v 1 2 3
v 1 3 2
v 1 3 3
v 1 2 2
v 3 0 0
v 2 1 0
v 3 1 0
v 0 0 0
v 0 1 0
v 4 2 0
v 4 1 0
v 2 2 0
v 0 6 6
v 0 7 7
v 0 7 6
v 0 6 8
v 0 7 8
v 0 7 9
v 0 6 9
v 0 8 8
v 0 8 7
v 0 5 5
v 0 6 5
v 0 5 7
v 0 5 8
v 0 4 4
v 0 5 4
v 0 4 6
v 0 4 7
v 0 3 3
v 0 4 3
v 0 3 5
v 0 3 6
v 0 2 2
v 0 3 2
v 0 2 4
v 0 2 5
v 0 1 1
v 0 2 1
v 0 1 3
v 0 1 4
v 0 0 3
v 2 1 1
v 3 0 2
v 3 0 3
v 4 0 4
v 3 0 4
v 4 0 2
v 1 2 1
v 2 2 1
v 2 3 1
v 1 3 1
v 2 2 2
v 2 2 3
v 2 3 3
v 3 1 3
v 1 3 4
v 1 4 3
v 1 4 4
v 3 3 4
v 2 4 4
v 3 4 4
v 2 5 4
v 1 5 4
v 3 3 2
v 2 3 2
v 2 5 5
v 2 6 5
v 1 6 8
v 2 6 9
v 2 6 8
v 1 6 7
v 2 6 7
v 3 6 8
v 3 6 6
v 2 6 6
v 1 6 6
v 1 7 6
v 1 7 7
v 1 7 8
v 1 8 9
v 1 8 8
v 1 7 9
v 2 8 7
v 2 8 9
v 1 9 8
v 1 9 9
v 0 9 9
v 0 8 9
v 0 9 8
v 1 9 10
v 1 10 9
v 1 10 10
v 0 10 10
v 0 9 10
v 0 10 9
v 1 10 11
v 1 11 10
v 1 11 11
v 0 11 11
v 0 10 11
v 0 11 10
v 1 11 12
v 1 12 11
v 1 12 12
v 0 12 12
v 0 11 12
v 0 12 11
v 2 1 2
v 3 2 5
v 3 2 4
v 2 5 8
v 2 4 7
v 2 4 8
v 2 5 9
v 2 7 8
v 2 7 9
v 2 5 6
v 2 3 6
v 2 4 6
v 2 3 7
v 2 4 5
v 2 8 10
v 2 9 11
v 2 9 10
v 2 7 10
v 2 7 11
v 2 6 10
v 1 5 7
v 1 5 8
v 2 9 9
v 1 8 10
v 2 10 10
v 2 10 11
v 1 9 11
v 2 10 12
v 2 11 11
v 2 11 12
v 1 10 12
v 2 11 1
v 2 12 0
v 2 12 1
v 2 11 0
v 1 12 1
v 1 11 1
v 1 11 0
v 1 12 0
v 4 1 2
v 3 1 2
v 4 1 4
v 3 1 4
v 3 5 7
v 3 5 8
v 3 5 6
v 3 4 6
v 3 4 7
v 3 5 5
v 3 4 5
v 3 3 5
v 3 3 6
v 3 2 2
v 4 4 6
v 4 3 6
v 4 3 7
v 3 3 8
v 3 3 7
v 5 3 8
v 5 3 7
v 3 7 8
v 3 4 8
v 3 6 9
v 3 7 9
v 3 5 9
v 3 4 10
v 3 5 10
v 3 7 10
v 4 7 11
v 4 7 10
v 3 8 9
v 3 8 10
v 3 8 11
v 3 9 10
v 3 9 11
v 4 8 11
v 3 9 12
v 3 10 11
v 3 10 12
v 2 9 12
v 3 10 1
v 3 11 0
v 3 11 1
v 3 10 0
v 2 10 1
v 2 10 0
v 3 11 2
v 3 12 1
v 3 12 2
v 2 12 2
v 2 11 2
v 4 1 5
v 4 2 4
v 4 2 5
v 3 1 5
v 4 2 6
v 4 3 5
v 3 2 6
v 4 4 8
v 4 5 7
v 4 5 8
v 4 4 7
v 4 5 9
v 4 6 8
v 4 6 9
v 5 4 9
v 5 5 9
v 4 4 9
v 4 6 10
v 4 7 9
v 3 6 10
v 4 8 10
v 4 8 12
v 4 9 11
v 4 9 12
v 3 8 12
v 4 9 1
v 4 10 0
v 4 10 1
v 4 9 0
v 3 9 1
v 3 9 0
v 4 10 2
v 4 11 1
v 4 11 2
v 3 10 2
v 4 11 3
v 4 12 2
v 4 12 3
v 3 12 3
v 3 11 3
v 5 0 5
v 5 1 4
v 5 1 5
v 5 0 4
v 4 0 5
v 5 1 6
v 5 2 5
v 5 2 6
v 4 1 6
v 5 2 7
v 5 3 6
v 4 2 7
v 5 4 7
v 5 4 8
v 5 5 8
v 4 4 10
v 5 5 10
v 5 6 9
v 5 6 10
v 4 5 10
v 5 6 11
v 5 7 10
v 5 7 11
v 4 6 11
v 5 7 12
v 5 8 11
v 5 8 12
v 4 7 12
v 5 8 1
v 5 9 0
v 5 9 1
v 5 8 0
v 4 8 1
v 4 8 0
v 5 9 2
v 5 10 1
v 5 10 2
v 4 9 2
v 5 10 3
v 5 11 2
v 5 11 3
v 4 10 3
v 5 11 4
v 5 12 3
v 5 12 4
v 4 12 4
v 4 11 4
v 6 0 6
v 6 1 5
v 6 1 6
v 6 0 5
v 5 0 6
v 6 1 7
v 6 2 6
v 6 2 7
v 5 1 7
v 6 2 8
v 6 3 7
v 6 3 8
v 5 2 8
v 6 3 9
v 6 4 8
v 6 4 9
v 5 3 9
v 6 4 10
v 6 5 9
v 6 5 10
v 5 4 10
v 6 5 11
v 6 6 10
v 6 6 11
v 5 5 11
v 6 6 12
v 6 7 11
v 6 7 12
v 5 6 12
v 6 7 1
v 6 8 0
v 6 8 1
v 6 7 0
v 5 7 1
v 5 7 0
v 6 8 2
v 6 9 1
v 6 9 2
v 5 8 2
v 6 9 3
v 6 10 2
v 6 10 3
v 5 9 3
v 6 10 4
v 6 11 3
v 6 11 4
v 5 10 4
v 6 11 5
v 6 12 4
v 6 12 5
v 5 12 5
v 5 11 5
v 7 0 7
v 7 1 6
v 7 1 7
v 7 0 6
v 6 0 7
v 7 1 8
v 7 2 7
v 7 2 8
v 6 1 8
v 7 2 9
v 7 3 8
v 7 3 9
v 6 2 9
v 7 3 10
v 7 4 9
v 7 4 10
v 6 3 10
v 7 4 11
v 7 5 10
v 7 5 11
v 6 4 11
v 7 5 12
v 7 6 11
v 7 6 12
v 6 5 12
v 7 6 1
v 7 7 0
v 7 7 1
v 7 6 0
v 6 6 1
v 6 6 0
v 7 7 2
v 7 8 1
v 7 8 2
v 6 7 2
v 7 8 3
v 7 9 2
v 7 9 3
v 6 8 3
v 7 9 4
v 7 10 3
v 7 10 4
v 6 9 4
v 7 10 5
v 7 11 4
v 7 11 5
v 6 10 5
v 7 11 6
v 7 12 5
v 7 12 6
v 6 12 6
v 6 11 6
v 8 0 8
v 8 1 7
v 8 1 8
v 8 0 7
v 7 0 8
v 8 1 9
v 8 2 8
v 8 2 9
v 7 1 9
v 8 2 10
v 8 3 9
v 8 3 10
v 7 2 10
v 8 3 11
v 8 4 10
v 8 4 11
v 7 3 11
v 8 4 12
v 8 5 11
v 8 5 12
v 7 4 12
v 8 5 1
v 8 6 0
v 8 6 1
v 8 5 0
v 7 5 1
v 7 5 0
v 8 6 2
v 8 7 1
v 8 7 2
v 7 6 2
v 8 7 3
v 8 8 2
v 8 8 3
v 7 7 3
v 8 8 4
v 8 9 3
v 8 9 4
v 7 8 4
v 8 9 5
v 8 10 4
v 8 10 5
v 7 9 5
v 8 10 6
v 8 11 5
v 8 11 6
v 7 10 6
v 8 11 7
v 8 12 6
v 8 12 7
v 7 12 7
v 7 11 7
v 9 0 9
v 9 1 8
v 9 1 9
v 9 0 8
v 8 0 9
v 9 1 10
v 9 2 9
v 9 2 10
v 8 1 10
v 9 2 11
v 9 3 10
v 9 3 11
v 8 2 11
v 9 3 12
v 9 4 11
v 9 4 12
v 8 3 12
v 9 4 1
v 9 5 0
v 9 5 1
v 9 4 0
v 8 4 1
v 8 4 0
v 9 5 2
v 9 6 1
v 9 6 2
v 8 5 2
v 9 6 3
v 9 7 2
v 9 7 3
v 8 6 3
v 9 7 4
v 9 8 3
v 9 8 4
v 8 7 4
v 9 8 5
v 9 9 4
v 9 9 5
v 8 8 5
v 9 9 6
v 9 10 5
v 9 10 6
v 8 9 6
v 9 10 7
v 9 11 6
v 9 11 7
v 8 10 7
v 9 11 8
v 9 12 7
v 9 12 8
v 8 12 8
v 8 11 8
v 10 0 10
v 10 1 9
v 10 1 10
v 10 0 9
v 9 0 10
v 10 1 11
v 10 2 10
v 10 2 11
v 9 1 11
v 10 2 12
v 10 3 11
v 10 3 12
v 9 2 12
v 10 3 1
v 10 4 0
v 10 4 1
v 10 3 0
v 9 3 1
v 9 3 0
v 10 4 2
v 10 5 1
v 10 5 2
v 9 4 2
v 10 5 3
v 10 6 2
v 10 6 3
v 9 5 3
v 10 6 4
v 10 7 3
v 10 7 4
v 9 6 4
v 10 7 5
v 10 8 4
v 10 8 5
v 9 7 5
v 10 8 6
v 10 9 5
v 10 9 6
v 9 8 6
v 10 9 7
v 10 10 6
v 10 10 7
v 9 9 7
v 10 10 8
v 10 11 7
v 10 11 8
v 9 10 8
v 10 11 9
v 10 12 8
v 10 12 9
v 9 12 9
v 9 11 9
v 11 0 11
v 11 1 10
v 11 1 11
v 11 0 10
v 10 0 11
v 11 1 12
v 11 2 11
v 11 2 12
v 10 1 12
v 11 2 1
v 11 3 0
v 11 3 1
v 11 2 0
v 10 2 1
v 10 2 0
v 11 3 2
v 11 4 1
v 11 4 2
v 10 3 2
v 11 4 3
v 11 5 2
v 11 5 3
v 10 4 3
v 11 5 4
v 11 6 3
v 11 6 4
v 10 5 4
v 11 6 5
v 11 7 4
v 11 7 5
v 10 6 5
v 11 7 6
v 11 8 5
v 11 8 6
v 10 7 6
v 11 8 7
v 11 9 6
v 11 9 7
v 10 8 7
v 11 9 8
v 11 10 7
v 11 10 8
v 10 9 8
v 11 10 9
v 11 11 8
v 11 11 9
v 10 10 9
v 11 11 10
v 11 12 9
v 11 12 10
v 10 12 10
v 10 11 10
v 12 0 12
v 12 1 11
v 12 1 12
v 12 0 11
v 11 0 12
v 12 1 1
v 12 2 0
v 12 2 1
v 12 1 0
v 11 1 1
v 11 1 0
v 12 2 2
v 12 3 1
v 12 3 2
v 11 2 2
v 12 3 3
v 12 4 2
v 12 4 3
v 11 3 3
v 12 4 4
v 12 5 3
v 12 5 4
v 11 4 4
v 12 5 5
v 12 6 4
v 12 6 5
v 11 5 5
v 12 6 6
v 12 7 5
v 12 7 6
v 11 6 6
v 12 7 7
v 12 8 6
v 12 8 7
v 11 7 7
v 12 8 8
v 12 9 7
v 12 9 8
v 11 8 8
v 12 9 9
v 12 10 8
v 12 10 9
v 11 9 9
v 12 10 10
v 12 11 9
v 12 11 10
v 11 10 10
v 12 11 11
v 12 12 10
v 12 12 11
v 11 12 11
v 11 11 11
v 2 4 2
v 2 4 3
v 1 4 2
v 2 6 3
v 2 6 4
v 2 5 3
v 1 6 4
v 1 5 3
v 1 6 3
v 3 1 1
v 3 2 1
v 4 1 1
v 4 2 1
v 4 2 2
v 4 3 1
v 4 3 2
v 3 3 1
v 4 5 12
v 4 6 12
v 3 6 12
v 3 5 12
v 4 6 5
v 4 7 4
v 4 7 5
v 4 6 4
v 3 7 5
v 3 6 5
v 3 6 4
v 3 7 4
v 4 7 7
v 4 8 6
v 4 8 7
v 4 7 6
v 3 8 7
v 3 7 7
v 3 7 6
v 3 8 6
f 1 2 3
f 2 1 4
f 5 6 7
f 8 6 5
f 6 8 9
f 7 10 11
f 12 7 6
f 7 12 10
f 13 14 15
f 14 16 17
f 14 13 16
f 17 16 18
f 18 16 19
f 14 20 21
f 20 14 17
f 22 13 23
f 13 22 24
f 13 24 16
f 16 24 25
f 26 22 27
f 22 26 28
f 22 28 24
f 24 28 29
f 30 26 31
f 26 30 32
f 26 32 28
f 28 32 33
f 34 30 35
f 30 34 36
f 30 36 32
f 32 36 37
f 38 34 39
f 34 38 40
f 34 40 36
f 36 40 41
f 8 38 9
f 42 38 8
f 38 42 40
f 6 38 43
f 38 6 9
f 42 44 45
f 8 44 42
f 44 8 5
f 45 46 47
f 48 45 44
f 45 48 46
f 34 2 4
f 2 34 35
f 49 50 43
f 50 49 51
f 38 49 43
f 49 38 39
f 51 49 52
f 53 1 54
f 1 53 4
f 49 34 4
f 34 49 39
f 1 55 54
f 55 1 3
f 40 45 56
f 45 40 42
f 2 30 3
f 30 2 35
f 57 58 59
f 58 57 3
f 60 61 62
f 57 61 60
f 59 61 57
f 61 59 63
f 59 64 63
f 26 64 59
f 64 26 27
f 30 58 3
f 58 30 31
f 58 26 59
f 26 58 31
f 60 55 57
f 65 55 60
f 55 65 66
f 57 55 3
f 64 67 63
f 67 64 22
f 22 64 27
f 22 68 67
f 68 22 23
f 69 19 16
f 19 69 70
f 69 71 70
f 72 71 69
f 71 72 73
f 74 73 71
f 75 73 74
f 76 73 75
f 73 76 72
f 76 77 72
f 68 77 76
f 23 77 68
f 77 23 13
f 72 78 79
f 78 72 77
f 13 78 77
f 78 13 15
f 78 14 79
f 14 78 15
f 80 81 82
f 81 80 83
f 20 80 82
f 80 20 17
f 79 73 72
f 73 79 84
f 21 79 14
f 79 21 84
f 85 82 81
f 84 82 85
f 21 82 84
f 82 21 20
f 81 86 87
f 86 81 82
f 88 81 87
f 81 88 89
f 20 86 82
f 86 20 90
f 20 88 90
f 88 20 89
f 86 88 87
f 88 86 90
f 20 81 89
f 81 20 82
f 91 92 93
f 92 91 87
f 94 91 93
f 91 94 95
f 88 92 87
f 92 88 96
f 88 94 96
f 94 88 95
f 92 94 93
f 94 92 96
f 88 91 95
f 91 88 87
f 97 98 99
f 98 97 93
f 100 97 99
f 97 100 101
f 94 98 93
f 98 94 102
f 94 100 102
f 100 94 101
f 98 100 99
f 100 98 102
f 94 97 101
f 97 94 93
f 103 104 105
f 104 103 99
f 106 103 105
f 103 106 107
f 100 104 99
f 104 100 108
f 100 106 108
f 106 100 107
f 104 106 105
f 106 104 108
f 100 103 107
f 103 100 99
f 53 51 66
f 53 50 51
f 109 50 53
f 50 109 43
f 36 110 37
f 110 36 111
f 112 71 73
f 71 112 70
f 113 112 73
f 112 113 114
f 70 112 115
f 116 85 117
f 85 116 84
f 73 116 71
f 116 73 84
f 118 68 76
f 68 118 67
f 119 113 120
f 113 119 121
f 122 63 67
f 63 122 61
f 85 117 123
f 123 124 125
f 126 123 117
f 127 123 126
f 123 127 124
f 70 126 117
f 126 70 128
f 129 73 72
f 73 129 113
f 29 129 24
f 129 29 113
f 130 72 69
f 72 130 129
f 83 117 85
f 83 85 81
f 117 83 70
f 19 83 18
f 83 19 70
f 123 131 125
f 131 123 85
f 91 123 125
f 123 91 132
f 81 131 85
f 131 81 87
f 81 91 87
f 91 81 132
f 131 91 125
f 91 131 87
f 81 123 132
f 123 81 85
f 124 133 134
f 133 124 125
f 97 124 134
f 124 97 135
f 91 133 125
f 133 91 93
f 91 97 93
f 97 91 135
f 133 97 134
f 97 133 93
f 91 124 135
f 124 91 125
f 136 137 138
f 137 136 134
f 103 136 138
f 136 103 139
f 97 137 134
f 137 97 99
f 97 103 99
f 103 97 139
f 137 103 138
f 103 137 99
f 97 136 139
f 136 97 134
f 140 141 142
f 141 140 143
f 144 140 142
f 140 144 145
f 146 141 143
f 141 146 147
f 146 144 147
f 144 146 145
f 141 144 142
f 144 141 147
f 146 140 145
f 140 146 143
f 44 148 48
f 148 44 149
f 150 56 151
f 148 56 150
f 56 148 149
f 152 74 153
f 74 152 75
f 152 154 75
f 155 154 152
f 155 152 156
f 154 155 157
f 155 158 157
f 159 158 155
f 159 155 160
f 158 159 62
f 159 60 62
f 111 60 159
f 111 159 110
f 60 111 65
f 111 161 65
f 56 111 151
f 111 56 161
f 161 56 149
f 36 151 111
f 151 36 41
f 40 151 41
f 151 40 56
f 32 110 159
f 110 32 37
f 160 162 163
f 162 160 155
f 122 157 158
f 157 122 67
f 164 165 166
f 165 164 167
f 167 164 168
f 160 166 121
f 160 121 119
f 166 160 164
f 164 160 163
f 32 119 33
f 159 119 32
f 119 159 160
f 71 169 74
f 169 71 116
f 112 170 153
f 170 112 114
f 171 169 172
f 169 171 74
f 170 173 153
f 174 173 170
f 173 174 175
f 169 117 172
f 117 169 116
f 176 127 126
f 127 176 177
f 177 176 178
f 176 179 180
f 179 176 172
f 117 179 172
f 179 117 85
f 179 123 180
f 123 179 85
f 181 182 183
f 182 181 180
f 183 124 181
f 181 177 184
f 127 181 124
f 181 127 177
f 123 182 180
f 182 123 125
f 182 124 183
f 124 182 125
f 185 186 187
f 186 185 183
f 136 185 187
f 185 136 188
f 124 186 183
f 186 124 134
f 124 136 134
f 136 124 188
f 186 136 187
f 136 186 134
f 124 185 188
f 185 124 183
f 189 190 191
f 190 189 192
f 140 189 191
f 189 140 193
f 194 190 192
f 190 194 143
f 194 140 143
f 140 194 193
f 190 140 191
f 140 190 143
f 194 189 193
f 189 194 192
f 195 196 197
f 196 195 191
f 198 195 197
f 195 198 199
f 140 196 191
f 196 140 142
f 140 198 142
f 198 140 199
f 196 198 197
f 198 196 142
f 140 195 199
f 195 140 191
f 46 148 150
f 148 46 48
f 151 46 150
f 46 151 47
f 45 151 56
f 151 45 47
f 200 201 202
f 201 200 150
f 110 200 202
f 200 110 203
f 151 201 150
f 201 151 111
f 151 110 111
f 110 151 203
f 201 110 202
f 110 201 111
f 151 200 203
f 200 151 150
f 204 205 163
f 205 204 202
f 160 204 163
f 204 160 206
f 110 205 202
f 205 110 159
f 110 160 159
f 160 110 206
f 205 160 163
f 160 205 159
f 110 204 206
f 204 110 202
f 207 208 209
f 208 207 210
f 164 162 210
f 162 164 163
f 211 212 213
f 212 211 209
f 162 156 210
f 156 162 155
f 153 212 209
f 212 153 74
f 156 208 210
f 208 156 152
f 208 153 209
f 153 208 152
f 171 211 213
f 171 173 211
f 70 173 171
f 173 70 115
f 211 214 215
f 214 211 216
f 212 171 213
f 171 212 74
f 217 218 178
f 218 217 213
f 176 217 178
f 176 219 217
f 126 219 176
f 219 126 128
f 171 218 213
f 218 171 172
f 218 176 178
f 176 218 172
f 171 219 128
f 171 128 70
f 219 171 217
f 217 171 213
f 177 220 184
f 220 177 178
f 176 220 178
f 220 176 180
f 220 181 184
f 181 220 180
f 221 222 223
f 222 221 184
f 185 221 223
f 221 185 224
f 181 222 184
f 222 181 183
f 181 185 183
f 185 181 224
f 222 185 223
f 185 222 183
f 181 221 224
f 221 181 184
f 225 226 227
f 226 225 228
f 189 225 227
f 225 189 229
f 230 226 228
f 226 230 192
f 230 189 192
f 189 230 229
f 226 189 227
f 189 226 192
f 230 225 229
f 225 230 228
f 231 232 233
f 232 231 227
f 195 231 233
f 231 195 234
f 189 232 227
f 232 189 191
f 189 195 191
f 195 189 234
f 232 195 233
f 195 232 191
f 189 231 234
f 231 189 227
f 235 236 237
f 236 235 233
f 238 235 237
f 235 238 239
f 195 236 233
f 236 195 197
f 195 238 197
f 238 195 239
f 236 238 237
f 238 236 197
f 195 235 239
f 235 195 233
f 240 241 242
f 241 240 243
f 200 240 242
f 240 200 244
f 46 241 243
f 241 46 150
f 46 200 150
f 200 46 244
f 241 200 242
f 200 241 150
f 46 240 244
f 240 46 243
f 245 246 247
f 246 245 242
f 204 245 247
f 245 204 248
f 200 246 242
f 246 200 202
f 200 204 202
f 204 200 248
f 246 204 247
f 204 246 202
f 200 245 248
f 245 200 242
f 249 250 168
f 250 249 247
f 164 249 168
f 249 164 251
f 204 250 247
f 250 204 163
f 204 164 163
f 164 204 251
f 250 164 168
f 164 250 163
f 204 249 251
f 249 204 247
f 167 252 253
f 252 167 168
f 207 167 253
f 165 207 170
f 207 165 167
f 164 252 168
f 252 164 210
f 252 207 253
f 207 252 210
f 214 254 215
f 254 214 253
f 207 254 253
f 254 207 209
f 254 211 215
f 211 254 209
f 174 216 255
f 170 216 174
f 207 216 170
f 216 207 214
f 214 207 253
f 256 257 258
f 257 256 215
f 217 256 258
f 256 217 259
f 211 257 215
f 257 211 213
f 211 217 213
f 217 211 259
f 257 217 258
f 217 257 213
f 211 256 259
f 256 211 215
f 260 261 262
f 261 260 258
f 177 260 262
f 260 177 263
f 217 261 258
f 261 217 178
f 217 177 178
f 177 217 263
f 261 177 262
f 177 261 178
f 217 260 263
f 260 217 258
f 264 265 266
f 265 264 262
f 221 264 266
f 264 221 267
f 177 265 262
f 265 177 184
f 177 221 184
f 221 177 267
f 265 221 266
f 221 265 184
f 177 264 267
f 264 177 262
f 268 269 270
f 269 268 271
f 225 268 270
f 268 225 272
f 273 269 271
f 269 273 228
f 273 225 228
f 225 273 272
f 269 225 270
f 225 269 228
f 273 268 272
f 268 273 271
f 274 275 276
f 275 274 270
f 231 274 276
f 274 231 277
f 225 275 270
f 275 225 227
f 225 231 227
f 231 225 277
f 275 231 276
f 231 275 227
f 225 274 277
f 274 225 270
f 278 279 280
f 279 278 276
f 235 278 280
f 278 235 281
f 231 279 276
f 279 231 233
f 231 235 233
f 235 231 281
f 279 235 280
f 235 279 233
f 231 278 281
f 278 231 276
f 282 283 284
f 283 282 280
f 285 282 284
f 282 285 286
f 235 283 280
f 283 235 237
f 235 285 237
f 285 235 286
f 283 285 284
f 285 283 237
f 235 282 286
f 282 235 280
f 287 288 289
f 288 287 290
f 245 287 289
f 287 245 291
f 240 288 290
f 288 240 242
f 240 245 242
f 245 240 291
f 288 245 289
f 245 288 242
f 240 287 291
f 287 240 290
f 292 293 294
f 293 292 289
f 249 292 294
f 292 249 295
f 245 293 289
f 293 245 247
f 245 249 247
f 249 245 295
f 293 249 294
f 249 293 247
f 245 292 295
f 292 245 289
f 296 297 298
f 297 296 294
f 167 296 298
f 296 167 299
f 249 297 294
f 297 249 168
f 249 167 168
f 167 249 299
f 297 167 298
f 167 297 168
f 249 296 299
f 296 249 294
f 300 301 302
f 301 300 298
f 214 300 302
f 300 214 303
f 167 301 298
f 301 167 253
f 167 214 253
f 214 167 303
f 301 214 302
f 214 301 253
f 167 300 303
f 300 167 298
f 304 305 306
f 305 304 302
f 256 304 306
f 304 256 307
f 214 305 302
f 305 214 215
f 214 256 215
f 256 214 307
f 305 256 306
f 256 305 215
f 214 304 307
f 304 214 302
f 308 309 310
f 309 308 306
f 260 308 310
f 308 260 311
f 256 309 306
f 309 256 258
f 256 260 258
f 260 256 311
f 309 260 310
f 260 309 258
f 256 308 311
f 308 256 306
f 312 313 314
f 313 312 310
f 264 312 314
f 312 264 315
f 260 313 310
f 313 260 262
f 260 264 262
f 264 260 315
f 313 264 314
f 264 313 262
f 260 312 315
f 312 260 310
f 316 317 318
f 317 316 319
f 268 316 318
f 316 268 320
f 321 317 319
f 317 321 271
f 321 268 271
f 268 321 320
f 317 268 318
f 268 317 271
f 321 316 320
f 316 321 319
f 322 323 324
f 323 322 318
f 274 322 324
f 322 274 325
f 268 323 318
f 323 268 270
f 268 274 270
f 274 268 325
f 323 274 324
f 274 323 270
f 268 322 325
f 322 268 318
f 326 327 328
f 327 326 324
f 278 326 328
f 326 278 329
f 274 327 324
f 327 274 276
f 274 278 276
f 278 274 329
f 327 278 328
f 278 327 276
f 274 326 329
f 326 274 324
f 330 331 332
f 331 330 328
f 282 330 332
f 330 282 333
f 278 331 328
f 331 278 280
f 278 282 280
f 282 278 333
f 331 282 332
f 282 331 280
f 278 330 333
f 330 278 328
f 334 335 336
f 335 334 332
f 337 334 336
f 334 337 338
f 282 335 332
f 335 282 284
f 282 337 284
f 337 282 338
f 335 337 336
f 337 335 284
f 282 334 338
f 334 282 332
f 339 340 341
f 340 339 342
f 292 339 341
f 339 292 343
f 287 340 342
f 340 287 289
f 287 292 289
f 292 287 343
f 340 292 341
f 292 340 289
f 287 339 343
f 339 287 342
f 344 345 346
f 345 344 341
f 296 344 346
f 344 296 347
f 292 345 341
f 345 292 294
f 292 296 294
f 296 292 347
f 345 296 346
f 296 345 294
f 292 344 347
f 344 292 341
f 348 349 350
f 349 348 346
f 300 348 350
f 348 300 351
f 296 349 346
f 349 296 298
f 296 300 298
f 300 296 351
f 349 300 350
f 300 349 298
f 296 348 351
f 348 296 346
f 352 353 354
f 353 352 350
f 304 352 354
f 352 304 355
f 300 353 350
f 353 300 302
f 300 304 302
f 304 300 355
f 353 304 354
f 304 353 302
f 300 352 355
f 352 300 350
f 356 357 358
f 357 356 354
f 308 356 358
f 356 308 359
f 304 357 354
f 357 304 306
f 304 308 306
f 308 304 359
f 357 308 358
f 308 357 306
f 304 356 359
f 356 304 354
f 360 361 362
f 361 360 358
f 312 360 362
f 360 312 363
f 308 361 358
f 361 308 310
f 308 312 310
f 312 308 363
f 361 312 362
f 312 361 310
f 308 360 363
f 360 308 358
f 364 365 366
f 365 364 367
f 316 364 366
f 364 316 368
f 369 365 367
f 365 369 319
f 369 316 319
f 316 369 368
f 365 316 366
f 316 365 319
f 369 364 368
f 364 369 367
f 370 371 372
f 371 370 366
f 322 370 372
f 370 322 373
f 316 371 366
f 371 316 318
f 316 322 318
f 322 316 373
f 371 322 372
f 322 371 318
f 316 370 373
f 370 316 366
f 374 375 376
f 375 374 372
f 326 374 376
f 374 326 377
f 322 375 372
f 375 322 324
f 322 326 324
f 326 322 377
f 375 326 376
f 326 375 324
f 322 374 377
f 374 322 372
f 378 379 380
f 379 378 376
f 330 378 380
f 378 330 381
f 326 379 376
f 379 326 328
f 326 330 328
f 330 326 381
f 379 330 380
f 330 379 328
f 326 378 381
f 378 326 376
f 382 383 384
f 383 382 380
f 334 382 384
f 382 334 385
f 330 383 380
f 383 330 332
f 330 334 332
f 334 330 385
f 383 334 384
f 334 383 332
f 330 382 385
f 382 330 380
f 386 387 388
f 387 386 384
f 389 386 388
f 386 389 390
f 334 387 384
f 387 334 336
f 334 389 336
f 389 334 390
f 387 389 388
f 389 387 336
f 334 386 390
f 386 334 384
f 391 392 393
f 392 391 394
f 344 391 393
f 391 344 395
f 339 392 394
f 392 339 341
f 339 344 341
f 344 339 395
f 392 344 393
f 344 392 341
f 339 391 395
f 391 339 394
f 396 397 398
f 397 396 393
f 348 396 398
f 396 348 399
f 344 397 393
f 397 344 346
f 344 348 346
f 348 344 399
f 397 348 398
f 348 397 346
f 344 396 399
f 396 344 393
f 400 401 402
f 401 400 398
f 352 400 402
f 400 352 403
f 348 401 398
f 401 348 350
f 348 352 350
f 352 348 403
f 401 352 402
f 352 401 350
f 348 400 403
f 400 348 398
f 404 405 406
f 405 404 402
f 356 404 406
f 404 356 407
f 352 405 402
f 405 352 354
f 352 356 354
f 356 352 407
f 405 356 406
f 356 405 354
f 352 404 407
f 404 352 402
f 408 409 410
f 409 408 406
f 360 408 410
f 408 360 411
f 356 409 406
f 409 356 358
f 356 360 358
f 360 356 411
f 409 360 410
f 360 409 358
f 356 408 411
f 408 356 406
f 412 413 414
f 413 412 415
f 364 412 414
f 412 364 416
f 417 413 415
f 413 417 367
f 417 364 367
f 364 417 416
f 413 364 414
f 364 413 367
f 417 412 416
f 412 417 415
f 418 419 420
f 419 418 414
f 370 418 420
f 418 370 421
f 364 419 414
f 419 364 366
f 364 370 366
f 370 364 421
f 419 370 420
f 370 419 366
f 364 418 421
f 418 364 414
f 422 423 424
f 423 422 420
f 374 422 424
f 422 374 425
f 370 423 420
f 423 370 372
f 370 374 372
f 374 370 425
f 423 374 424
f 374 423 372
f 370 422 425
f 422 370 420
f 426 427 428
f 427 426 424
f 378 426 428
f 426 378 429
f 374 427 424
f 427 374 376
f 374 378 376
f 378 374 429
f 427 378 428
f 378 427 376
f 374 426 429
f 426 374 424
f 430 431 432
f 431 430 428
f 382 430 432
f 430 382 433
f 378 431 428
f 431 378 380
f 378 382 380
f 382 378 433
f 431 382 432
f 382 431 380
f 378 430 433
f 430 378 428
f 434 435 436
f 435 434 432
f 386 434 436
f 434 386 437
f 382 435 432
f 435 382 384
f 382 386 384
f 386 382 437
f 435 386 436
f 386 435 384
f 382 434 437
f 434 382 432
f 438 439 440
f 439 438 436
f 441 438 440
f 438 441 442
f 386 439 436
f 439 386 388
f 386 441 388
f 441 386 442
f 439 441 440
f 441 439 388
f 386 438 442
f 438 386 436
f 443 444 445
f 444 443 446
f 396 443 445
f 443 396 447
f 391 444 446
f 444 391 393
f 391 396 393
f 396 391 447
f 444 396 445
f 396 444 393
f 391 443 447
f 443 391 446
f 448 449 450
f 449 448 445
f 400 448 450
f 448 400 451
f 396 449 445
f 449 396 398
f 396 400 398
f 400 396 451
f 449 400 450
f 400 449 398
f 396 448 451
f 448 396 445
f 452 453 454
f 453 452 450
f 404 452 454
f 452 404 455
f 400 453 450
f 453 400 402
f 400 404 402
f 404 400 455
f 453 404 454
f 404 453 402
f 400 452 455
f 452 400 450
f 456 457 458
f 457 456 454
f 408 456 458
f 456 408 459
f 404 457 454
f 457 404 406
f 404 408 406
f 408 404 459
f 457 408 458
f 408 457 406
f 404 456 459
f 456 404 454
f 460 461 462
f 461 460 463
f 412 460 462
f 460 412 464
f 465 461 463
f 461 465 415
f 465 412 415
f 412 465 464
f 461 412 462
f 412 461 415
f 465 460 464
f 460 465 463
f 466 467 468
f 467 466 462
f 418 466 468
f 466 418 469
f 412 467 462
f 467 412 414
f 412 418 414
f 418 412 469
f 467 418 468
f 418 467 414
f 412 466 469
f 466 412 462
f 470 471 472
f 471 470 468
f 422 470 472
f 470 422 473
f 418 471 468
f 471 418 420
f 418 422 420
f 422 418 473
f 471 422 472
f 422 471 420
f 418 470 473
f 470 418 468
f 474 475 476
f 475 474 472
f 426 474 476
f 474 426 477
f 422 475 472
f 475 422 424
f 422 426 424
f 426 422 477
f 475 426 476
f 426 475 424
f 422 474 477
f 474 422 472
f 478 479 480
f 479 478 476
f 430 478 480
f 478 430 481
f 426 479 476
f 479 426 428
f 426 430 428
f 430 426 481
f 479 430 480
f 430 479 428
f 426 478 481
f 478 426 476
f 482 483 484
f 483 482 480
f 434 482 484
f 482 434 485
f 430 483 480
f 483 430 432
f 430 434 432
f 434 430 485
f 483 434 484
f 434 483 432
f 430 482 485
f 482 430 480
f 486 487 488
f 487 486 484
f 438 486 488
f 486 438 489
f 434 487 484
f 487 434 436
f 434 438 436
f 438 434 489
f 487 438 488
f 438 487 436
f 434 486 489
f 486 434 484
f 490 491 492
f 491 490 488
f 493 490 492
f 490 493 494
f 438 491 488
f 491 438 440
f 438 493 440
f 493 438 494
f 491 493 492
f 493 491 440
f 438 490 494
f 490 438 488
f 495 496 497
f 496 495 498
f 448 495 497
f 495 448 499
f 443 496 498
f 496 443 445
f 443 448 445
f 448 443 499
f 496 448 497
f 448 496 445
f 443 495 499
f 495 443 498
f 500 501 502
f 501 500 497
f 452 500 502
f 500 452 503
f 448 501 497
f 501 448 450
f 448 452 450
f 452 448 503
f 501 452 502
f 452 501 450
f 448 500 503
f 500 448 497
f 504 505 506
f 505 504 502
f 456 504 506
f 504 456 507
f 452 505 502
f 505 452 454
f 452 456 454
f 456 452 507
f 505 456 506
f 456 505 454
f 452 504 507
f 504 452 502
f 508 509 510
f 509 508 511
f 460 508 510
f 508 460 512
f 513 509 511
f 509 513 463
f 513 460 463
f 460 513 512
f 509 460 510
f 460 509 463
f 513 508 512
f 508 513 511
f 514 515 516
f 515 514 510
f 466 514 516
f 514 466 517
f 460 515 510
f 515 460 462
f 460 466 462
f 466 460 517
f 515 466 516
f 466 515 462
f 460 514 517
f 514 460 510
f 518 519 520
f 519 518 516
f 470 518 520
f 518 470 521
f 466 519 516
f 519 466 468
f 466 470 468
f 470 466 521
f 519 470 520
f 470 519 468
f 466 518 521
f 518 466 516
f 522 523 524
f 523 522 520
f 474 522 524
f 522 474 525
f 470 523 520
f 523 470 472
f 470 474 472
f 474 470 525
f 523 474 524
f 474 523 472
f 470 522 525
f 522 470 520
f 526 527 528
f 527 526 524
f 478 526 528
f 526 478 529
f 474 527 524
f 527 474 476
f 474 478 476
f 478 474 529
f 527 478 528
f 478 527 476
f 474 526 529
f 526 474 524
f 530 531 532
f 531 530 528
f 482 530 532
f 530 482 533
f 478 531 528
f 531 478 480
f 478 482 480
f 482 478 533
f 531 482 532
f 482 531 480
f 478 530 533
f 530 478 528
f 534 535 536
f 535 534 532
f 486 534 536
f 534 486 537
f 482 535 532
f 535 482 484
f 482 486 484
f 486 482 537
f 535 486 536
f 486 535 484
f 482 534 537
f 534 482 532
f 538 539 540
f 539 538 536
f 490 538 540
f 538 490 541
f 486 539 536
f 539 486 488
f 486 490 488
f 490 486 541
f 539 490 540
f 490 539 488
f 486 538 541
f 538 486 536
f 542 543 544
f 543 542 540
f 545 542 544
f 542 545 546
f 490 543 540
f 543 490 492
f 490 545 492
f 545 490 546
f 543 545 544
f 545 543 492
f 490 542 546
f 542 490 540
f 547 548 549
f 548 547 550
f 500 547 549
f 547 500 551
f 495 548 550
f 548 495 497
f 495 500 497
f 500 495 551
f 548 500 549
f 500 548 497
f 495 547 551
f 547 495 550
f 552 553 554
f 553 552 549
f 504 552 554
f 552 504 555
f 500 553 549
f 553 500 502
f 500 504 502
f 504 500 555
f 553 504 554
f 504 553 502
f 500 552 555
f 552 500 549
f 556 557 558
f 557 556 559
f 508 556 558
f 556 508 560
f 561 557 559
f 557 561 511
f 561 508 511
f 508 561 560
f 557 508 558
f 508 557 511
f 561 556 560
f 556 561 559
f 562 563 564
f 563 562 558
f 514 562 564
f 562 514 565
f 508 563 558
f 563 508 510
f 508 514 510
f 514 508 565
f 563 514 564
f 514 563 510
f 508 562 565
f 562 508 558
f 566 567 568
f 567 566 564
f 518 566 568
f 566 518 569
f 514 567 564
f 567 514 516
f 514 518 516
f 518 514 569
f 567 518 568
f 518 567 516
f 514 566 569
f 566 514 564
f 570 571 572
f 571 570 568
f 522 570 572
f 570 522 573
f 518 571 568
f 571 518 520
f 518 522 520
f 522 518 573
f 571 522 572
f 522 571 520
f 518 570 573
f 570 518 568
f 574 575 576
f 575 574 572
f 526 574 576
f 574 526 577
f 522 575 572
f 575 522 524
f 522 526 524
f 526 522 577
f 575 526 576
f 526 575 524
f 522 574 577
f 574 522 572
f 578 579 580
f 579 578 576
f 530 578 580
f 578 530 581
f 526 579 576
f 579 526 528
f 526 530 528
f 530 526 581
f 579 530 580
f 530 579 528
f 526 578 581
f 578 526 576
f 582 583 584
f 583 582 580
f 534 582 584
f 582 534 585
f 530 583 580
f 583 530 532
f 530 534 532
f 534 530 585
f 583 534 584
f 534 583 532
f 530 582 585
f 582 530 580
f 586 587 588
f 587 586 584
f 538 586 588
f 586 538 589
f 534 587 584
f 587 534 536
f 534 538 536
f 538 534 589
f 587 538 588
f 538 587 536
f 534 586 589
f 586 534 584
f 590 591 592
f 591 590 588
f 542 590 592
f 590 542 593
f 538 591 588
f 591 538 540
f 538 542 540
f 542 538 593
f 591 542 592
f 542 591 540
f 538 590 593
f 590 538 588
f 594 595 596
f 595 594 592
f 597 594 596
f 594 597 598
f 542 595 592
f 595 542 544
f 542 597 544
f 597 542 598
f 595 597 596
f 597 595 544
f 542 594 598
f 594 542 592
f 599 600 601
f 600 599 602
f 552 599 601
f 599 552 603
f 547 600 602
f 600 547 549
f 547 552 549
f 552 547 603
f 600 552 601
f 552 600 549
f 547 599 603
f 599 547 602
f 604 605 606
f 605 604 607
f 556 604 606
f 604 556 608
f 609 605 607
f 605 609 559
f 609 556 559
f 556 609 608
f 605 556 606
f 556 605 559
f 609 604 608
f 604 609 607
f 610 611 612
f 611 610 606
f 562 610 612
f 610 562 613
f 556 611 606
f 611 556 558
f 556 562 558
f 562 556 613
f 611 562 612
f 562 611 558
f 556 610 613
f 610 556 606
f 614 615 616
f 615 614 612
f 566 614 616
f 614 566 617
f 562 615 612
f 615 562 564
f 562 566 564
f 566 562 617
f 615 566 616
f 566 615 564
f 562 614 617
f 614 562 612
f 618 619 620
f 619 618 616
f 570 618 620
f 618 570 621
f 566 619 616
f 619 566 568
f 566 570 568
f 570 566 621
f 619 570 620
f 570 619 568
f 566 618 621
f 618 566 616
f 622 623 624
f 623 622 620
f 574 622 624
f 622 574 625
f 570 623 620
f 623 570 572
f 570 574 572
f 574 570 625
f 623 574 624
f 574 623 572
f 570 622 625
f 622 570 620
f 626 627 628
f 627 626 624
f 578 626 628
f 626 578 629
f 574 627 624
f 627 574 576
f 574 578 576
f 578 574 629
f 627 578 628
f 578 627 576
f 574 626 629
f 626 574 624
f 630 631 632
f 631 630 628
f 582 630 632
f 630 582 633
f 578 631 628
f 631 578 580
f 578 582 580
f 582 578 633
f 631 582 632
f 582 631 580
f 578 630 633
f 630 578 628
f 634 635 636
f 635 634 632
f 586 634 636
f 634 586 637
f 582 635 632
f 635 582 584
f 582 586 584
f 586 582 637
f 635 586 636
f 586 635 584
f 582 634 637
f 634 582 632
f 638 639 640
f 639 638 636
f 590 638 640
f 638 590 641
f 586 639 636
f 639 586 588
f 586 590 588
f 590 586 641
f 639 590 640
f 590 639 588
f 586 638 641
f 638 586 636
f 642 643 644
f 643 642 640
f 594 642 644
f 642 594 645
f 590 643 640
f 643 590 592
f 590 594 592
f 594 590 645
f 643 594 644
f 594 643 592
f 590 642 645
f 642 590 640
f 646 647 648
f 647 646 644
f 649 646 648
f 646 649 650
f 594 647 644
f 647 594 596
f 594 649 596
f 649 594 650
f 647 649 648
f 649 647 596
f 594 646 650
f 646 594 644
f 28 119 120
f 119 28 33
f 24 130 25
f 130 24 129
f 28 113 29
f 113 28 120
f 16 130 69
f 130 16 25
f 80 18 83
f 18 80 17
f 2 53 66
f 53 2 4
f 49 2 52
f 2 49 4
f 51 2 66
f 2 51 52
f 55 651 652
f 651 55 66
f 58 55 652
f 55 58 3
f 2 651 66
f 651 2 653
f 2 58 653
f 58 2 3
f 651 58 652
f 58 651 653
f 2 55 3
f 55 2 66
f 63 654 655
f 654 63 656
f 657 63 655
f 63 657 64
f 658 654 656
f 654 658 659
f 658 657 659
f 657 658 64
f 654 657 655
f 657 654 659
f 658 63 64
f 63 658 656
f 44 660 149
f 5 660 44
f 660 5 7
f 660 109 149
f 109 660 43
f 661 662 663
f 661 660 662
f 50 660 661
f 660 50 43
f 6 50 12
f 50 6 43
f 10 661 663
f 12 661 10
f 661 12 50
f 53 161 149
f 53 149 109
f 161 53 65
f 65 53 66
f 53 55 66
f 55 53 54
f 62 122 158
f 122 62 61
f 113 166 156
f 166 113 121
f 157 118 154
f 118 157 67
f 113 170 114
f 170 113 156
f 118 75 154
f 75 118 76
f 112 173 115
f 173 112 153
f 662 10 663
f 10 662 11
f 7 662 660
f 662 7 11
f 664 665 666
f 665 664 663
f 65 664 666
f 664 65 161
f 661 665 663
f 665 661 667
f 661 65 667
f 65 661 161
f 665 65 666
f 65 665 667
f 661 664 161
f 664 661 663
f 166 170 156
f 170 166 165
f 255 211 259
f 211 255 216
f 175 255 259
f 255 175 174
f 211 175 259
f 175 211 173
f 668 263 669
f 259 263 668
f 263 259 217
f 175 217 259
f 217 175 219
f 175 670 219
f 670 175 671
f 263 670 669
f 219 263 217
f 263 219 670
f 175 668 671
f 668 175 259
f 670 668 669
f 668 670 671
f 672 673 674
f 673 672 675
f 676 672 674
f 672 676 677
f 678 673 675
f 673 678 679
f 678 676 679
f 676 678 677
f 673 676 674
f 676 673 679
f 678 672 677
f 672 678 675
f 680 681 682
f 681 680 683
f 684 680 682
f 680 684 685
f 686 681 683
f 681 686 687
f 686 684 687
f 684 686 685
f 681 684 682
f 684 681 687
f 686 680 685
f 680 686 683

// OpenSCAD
union() {
    translate([0, 0, 0]) cube([1, 1, 1]);
    translate([0, 1, 1]) cube([1, 1, 1]);
    translate([0, 2, 2]) cube([1, 1, 1]);
    translate([0, 3, 3]) cube([1, 1, 1]);
    translate([0, 4, 4]) cube([1, 1, 1]);
    translate([0, 5, 5]) cube([1, 1, 1]);
    translate([0, 6, 6]) cube([1, 1, 1]);
    translate([0, 7, 7]) cube([1, 1, 1]);
    translate([0, 8, 8]) cube([1, 1, 1]);
    translate([0, 9, 9]) cube([1, 1, 1]);
    translate([0, 10, 10]) cube([1, 1, 1]);
    translate([0, 11, 11]) cube([1, 1, 1]);
    translate([1, 0, 1]) cube([1, 1, 1]);
    translate([1, 1, 2]) cube([1, 1, 1]);
    translate([1, 2, 3]) cube([1, 1, 1]);
    translate([1, 3, 4]) cube([1, 1, 1]);
    translate([1, 4, 5]) cube([1, 1, 1]);
    translate([1, 5, 6]) cube([1, 1, 1]);
    translate([1, 6, 7]) cube([1, 1, 1]);
    translate([1, 7, 8]) cube([1, 1, 1]);
    translate([1, 8, 9]) cube([1, 1, 1]);
    translate([1, 9, 10]) cube([1, 1, 1]);
    translate([1, 10, 11]) cube([1, 1, 1]);
    translate([1, 11, 0]) cube([1, 1, 1]);
    translate([2, 0, 2]) cube([1, 1, 1]);
    translate([2, 1, 3]) cube([1, 1, 1]);
    translate([2, 2, 4]) cube([1, 1, 1]);
    translate([2, 3, 5]) cube([1, 1, 1]);
    translate([2, 4, 6]) cube([1, 1, 1]);
    translate([2, 5, 7]) cube([1, 1, 1]);
    translate([2, 6, 8]) cube([1, 1, 1]);
    translate([2, 7, 9]) cube([1, 1, 1]);
    translate([2, 8, 10]) cube([1, 1, 1]);
    translate([2, 9, 11]) cube([1, 1, 1]);
    translate([2, 10, 0]) cube([1, 1, 1]);
    translate([2, 11, 1]) cube([1, 1, 1]);
    translate([3, 0, 3]) cube([1, 1, 1]);
    translate([3, 1, 4]) cube([1, 1, 1]);
    translate([3, 2, 5]) cube([1, 1, 1]);
    translate([3, 3, 6]) cube([1, 1, 1]);
    translate([3, 4, 7]) cube([1, 1, 1]);
    translate([3, 5, 8]) cube([1, 1, 1]);
    translate([3, 6, 9]) cube([1, 1, 1]);
    translate([3, 7, 10]) cube([1, 1, 1]);
    translate([3, 8, 11]) cube([1, 1, 1]);
    translate([3, 9, 0]) cube([1, 1, 1]);
    translate([3, 10, 1]) cube([1, 1, 1]);
    translate([3, 11, 2]) cube([1, 1, 1]);
    translate([4, 0, 4]) cube([1, 1, 1]);
    translate([4, 1, 5]) cube([1, 1, 1]);
    translate([4, 2, 6]) cube([1, 1, 1]);
    translate([4, 3, 7]) cube([1, 1, 1]);
    translate([4, 4, 8]) cube([1, 1, 1]);
    translate([4, 5, 9]) cube([1, 1, 1]);
    translate([4, 6, 10]) cube([1, 1, 1]);
    translate([4, 7, 11]) cube([1, 1, 1]);
    translate([4, 8, 0]) cube([1, 1, 1]);
    translate([4, 9, 1]) cube([1, 1, 1]);
    translate([4, 10, 2]) cube([1, 1, 1]);
    translate([4, 11, 3]) cube([1, 1, 1]);
    translate([5, 0, 5]) cube([1, 1, 1]);
    translate([5, 1, 6]) cube([1, 1, 1]);
    translate([5, 2, 7]) cube([1, 1, 1]);
    translate([5, 3, 8]) cube([1, 1, 1]);
    translate([5, 4, 9]) cube([1, 1, 1]);
    translate([5, 5, 10]) cube([1, 1, 1]);
    translate([5, 6, 11]) cube([1, 1, 1]);
    translate([5, 7, 0]) cube([1, 1, 1]);
    translate([5, 8, 1]) cube([1, 1, 1]);
    translate([5, 9, 2]) cube([1, 1, 1]);
    translate([5, 10, 3]) cube([1, 1, 1]);
    translate([5, 11, 4]) cube([1, 1, 1]);
    translate([6, 0, 6]) cube([1, 1, 1]);
    translate([6, 1, 7]) cube([1, 1, 1]);
    translate([6, 2, 8]) cube([1, 1, 1]);
    translate([6, 3, 9]) cube([1, 1, 1]);
    translate([6, 4, 10]) cube([1, 1, 1]);
    translate([6, 5, 11]) cube([1, 1, 1]);
    translate([6, 6, 0]) cube([1, 1, 1]);
    translate([6, 7, 1]) cube([1, 1, 1]);
    translate([6, 8, 2]) cube([1, 1, 1]);
    translate([6, 9, 3]) cube([1, 1, 1]);
    translate([6, 10, 4]) cube([1, 1, 1]);
    translate([6, 11, 5]) cube([1, 1, 1]);
    translate([7, 0, 7]) cube([1, 1, 1]);
    translate([7, 1, 8]) cube([1, 1, 1]);
    translate([7, 2, 9]) cube([1, 1, 1]);
    translate([7, 3, 10]) cube([1, 1, 1]);
    translate([7, 4, 11]) cube([1, 1, 1]);
    translate([7, 5, 0]) cube([1, 1, 1]);
    translate([7, 6, 1]) cube([1, 1, 1]);
    translate([7, 7, 2]) cube([1, 1, 1]);
    translate([7, 8, 3]) cube([1, 1, 1]);
    translate([7, 9, 4]) cube([1, 1, 1]);
    translate([7, 10, 5]) cube([1, 1, 1]);
    translate([7, 11, 6]) cube([1, 1, 1]);
    translate([8, 0, 8]) cube([1, 1, 1]);
    translate([8, 1, 9]) cube([1, 1, 1]);
    translate([8, 2, 10]) cube([1, 1, 1]);
    translate([8, 3, 11]) cube([1, 1, 1]);
    translate([8, 4, 0]) cube([1, 1, 1]);
    translate([8, 5, 1]) cube([1, 1, 1]);
    translate([8, 6, 2]) cube([1, 1, 1]);
    translate([8, 7, 3]) cube([1, 1, 1]);
    translate([8, 8, 4]) cube([1, 1, 1]);
    translate([8, 9, 5]) cube([1, 1, 1]);
    translate([8, 10, 6]) cube([1, 1, 1]);
    translate([8, 11, 7]) cube([1, 1, 1]);
    translate([9, 0, 9]) cube([1, 1, 1]);
    translate([9, 1, 10]) cube([1, 1, 1]);
    translate([9, 2, 11]) cube([1, 1, 1]);
    translate([9, 3, 0]) cube([1, 1, 1]);
    translate([9, 4, 1]) cube([1, 1, 1]);
    translate([9, 5, 2]) cube([1, 1, 1]);
    translate([9, 6, 3]) cube([1, 1, 1]);
    translate([9, 7, 4]) cube([1, 1, 1]);
    translate([9, 8, 5]) cube([1, 1, 1]);
    translate([9, 9, 6]) cube([1, 1, 1]);
    translate([9, 10, 7]) cube([1, 1, 1]);
    translate([9, 11, 8]) cube([1, 1, 1]);
    translate([10, 0, 10]) cube([1, 1, 1]);
    translate([10, 1, 11]) cube([1, 1, 1]);
    translate([10, 2, 0]) cube([1, 1, 1]);
    translate([10, 3, 1]) cube([1, 1, 1]);
    translate([10, 4, 2]) cube([1, 1, 1]);
    translate([10, 5, 3]) cube([1, 1, 1]);
    translate([10, 6, 4]) cube([1, 1, 1]);
    translate([10, 7, 5]) cube([1, 1, 1]);
    translate([10, 8, 6]) cube([1, 1, 1]);
    translate([10, 9, 7]) cube([1, 1, 1]);
    translate([10, 10, 8]) cube([1, 1, 1]);
    translate([10, 11, 9]) cube([1, 1, 1]);
    translate([11, 0, 11]) cube([1, 1, 1]);
    translate([11, 1, 0]) cube([1, 1, 1]);
    translate([11, 2, 1]) cube([1, 1, 1]);
    translate([11, 3, 2]) cube([1, 1, 1]);
    translate([11, 4, 3]) cube([1, 1, 1]);
    translate([11, 5, 4]) cube([1, 1, 1]);
    translate([11, 6, 5]) cube([1, 1, 1]);
    translate([11, 7, 6]) cube([1, 1, 1]);
    translate([11, 8, 7]) cube([1, 1, 1]);
    translate([11, 9, 8]) cube([1, 1, 1]);
    translate([11, 10, 9]) cube([1, 1, 1]);
    translate([11, 11, 10]) cube([1, 1, 1]);
    translate([0, 0, 1]) cube([1, 1, 1]);
    translate([0, 0, 2]) cube([1, 1, 1]);
    translate([0, 1, 2]) cube([1, 1, 1]);
    translate([0, 1, 3]) cube([1, 1, 1]);
    translate([0, 2, 3]) cube([1, 1, 1]);
    translate([0, 2, 4]) cube([1, 1, 1]);
    translate([0, 3, 4]) cube([1, 1, 1]);
    translate([0, 3, 5]) cube([1, 1, 1]);
    translate([0, 4, 5]) cube([1, 1, 1]);
    translate([0, 4, 6]) cube([1, 1, 1]);
    translate([0, 5, 6]) cube([1, 1, 1]);
    translate([0, 5, 7]) cube([1, 1, 1]);
    translate([0, 6, 7]) cube([1, 1, 1]);
    translate([0, 6, 8]) cube([1, 1, 1]);
    translate([1, 0, 0]) cube([1, 1, 1]);
    translate([1, 0, 2]) cube([1, 1, 1]);
    translate([1, 1, 1]) cube([1, 1, 1]);
    translate([1, 1, 3]) cube([1, 1, 1]);
    translate([1, 2, 1]) cube([1, 1, 1]);
    translate([1, 2, 4]) cube([1, 1, 1]);
    translate([1, 3, 2]) cube([1, 1, 1]);
    translate([1, 3, 5]) cube([1, 1, 1]);
    translate([1, 4, 4]) cube([1, 1, 1]);
    translate([1, 4, 6]) cube([1, 1, 1]);
    translate([1, 5, 3]) cube([1, 1, 1]);
    translate([1, 5, 5]) cube([1, 1, 1]);
    translate([1, 6, 8]) cube([1, 1, 1]);
    translate([1, 7, 7]) cube([1, 1, 1]);
    translate([2, 0, 0]) cube([1, 1, 1]);
    translate([2, 0, 1]) cube([1, 1, 1]);
    translate([2, 1, 0]) cube([1, 1, 1]);
    translate([2, 1, 2]) cube([1, 1, 1]);
    translate([2, 2, 2]) cube([1, 1, 1]);
    translate([2, 2, 3]) cube([1, 1, 1]);
    translate([2, 3, 4]) cube([1, 1, 1]);
    translate([2, 3, 6]) cube([1, 1, 1]);
    translate([2, 4, 5]) cube([1, 1, 1]);
    translate([2, 4, 7]) cube([1, 1, 1]);
    translate([2, 5, 6]) cube([1, 1, 1]);
    translate([2, 5, 8]) cube([1, 1, 1]);
    translate([2, 6, 9]) cube([1, 1, 1]);
    translate([2, 7, 10]) cube([1, 1, 1]);
    translate([3, 0, 2]) cube([1, 1, 1]);
    translate([3, 0, 3]) cube([1, 1, 1]);
    translate([3, 1, 0]) cube([1, 1, 1]);
    translate([3, 1, 4]) cube([1, 1, 1]);
    translate([3, 2, 1]) cube([1, 1, 1]);
    translate([3, 2, 5]) cube([1, 1, 1]);
    translate([3, 3, 6]) cube([1, 1, 1]);
    translate([3, 3, 7]) cube([1, 1, 1]);
    translate([3, 4, 8]) cube([1, 1, 1]);
    translate([3, 4, 9]) cube([1, 1, 1]);
    translate([3, 5, 10]) cube([1, 1, 1]);
    translate([3, 5, 11]) cube([1, 1, 1]);
    translate([3, 6, 4]) cube([1, 1, 1]);
    translate([3, 7, 6]) cube([1, 1, 1]);
}
